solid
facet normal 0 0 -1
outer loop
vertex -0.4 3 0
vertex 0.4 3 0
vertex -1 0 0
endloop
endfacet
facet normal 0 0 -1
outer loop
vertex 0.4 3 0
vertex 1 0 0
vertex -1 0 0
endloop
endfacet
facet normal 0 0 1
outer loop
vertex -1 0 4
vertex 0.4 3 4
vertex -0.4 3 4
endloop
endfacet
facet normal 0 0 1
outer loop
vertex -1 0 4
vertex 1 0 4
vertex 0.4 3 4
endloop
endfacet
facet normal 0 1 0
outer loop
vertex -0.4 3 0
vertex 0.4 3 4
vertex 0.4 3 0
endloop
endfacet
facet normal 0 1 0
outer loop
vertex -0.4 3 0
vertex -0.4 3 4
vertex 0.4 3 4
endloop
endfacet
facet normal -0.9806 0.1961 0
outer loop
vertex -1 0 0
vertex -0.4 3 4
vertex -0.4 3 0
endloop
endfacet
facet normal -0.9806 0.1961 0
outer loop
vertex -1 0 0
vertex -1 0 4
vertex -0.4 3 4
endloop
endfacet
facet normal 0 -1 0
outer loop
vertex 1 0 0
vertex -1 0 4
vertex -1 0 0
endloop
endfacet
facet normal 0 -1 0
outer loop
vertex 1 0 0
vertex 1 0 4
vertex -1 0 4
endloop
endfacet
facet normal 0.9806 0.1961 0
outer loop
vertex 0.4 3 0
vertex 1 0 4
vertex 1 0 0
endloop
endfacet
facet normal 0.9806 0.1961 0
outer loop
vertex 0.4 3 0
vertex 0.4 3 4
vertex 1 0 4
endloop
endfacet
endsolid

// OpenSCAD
$fn = 30;

SERVO_HEAD_DIAMETER = 5.92;
SERVO_HEAD_HEIGHT = 4;

HOLDER_THICKNESS = 1;

SCREW_DIAMETER = 1;

module teeth() {
    height = 3;
    length = 2;
    width = 0.8;

    linear_extrude(height = SERVO_HEAD_HEIGHT) {
        polygon([[-length / 2,0],[-width / 2,height],[width / 2,height],[length / 2,0]]);
    }
}

module servo_hold() {
    difference() {
        cylinder(r = SERVO_HEAD_DIAMETER / 2 + HOLDER_THICKNESS, h = SERVO_HEAD_HEIGHT + 1);
        translate([0, 0, -0.1]) {
            cylinder(r = SERVO_HEAD_DIAMETER / 2, h = SERVO_HEAD_HEIGHT);
        }

        cylinder(r = SCREW_DIAMETER, h = 10);
    }
}

//servo_hold();

teeth();
